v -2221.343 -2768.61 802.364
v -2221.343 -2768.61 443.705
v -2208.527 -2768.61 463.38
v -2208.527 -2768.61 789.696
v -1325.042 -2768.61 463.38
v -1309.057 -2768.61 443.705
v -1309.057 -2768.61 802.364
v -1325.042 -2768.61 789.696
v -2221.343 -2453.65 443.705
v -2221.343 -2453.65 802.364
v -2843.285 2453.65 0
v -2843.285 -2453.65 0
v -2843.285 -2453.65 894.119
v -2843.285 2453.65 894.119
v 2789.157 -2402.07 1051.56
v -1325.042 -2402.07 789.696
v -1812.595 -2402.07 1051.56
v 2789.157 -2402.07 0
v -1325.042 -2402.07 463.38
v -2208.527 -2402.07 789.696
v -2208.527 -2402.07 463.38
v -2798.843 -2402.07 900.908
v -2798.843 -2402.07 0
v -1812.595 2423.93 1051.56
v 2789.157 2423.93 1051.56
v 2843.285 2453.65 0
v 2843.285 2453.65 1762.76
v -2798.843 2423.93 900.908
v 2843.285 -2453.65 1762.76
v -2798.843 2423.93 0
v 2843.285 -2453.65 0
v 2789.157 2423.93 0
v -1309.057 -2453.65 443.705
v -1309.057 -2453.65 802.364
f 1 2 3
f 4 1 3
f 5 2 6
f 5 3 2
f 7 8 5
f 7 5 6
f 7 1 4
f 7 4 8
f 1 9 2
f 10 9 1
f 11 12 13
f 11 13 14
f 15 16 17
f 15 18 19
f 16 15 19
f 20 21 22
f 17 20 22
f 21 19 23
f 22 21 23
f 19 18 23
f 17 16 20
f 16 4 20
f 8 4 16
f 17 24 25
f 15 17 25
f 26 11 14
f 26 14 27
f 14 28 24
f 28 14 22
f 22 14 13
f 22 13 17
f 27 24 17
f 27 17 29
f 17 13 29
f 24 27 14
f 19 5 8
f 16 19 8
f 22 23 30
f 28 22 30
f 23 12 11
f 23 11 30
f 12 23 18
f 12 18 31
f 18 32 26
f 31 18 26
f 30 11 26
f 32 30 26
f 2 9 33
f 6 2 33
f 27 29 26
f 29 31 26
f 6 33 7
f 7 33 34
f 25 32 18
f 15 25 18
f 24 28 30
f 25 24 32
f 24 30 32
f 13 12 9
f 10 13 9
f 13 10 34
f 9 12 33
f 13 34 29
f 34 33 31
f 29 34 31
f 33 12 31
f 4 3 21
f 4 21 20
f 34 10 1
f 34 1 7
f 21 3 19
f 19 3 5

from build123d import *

# Parameters (mm, degrees)
F0_W      = 5686.5700594
F0_H      = 4907.2993548
F2_DEPTH  = 1051.56
F3_W      = 912.28556633
F3_H      = 358.6589396
F4_DEPTH  = 314.96
F5_W      = 883.4848403931
F5_H      = 326.3165652752
F6_DEPTH  = 1803.4
F7_W      = 5686.5700594
F7_H      = 4907.2993548
F8_DEPTH  = 711.2
F10_DEPTH = 6418.58


# Not quite as in the source:
# - the program builds the solid bodies; features that only make, move or delete a surface that nothing else refers to are left out


with BuildPart() as f2:
    # F0 (on Top) → F2 (new body)
    with BuildSketch(Plane.XY):
        with Locations((-1.27e-05, 0)):
            Rectangle(F0_W, F0_H)
        Polygon((-2798.8430942, 1200.4981324), (-2798.8430942, 2423.930382), (-1600.664185, 2423.930382), (-1528.8430942, 2423.930382), (2789.1569058, 2423.930382), (2789.1569058, -2402.069618), (-2798.8430942, -2402.069618), (-2798.8430942, 1128.530382), align=None, mode=Mode.SUBTRACT)
    extrude(amount=F2_DEPTH)

    # F3 (on face) → F4 (join)
    with BuildSketch(Plane.XZ.offset(2453.6496774)):
        with Locations((-1765.2000188828, 623.0345219374)):
            Rectangle(F3_W, F3_H)
    extrude(amount=F4_DEPTH)

    # F5 (on face) → F6 (cut)
    with BuildSketch(Plane.XZ.offset(2768.6096774)):
        with Locations((-1766.7844295502, 626.5381127596)):
            Rectangle(F5_W, F5_H)
    extrude(amount=-F6_DEPTH, mode=Mode.SUBTRACT)

    # F7 (on face) → F8 (join)
    with BuildSketch(Plane.XY.offset(1051.56)):
        with Locations((-1.27e-05, 0)):
            Rectangle(F7_W, F7_H)
    extrude(amount=F8_DEPTH)

    # F9 (on face) → F10 (cut)
    with BuildSketch(Plane.XZ.offset(2453.6496774)):
        Polygon((-2843.2850424, 1762.76), (-2843.2850424, 894.1189227129), (2843.285017, 1762.76), align=None)
    extrude(amount=-F10_DEPTH, mode=Mode.SUBTRACT)


solid = f2.part
